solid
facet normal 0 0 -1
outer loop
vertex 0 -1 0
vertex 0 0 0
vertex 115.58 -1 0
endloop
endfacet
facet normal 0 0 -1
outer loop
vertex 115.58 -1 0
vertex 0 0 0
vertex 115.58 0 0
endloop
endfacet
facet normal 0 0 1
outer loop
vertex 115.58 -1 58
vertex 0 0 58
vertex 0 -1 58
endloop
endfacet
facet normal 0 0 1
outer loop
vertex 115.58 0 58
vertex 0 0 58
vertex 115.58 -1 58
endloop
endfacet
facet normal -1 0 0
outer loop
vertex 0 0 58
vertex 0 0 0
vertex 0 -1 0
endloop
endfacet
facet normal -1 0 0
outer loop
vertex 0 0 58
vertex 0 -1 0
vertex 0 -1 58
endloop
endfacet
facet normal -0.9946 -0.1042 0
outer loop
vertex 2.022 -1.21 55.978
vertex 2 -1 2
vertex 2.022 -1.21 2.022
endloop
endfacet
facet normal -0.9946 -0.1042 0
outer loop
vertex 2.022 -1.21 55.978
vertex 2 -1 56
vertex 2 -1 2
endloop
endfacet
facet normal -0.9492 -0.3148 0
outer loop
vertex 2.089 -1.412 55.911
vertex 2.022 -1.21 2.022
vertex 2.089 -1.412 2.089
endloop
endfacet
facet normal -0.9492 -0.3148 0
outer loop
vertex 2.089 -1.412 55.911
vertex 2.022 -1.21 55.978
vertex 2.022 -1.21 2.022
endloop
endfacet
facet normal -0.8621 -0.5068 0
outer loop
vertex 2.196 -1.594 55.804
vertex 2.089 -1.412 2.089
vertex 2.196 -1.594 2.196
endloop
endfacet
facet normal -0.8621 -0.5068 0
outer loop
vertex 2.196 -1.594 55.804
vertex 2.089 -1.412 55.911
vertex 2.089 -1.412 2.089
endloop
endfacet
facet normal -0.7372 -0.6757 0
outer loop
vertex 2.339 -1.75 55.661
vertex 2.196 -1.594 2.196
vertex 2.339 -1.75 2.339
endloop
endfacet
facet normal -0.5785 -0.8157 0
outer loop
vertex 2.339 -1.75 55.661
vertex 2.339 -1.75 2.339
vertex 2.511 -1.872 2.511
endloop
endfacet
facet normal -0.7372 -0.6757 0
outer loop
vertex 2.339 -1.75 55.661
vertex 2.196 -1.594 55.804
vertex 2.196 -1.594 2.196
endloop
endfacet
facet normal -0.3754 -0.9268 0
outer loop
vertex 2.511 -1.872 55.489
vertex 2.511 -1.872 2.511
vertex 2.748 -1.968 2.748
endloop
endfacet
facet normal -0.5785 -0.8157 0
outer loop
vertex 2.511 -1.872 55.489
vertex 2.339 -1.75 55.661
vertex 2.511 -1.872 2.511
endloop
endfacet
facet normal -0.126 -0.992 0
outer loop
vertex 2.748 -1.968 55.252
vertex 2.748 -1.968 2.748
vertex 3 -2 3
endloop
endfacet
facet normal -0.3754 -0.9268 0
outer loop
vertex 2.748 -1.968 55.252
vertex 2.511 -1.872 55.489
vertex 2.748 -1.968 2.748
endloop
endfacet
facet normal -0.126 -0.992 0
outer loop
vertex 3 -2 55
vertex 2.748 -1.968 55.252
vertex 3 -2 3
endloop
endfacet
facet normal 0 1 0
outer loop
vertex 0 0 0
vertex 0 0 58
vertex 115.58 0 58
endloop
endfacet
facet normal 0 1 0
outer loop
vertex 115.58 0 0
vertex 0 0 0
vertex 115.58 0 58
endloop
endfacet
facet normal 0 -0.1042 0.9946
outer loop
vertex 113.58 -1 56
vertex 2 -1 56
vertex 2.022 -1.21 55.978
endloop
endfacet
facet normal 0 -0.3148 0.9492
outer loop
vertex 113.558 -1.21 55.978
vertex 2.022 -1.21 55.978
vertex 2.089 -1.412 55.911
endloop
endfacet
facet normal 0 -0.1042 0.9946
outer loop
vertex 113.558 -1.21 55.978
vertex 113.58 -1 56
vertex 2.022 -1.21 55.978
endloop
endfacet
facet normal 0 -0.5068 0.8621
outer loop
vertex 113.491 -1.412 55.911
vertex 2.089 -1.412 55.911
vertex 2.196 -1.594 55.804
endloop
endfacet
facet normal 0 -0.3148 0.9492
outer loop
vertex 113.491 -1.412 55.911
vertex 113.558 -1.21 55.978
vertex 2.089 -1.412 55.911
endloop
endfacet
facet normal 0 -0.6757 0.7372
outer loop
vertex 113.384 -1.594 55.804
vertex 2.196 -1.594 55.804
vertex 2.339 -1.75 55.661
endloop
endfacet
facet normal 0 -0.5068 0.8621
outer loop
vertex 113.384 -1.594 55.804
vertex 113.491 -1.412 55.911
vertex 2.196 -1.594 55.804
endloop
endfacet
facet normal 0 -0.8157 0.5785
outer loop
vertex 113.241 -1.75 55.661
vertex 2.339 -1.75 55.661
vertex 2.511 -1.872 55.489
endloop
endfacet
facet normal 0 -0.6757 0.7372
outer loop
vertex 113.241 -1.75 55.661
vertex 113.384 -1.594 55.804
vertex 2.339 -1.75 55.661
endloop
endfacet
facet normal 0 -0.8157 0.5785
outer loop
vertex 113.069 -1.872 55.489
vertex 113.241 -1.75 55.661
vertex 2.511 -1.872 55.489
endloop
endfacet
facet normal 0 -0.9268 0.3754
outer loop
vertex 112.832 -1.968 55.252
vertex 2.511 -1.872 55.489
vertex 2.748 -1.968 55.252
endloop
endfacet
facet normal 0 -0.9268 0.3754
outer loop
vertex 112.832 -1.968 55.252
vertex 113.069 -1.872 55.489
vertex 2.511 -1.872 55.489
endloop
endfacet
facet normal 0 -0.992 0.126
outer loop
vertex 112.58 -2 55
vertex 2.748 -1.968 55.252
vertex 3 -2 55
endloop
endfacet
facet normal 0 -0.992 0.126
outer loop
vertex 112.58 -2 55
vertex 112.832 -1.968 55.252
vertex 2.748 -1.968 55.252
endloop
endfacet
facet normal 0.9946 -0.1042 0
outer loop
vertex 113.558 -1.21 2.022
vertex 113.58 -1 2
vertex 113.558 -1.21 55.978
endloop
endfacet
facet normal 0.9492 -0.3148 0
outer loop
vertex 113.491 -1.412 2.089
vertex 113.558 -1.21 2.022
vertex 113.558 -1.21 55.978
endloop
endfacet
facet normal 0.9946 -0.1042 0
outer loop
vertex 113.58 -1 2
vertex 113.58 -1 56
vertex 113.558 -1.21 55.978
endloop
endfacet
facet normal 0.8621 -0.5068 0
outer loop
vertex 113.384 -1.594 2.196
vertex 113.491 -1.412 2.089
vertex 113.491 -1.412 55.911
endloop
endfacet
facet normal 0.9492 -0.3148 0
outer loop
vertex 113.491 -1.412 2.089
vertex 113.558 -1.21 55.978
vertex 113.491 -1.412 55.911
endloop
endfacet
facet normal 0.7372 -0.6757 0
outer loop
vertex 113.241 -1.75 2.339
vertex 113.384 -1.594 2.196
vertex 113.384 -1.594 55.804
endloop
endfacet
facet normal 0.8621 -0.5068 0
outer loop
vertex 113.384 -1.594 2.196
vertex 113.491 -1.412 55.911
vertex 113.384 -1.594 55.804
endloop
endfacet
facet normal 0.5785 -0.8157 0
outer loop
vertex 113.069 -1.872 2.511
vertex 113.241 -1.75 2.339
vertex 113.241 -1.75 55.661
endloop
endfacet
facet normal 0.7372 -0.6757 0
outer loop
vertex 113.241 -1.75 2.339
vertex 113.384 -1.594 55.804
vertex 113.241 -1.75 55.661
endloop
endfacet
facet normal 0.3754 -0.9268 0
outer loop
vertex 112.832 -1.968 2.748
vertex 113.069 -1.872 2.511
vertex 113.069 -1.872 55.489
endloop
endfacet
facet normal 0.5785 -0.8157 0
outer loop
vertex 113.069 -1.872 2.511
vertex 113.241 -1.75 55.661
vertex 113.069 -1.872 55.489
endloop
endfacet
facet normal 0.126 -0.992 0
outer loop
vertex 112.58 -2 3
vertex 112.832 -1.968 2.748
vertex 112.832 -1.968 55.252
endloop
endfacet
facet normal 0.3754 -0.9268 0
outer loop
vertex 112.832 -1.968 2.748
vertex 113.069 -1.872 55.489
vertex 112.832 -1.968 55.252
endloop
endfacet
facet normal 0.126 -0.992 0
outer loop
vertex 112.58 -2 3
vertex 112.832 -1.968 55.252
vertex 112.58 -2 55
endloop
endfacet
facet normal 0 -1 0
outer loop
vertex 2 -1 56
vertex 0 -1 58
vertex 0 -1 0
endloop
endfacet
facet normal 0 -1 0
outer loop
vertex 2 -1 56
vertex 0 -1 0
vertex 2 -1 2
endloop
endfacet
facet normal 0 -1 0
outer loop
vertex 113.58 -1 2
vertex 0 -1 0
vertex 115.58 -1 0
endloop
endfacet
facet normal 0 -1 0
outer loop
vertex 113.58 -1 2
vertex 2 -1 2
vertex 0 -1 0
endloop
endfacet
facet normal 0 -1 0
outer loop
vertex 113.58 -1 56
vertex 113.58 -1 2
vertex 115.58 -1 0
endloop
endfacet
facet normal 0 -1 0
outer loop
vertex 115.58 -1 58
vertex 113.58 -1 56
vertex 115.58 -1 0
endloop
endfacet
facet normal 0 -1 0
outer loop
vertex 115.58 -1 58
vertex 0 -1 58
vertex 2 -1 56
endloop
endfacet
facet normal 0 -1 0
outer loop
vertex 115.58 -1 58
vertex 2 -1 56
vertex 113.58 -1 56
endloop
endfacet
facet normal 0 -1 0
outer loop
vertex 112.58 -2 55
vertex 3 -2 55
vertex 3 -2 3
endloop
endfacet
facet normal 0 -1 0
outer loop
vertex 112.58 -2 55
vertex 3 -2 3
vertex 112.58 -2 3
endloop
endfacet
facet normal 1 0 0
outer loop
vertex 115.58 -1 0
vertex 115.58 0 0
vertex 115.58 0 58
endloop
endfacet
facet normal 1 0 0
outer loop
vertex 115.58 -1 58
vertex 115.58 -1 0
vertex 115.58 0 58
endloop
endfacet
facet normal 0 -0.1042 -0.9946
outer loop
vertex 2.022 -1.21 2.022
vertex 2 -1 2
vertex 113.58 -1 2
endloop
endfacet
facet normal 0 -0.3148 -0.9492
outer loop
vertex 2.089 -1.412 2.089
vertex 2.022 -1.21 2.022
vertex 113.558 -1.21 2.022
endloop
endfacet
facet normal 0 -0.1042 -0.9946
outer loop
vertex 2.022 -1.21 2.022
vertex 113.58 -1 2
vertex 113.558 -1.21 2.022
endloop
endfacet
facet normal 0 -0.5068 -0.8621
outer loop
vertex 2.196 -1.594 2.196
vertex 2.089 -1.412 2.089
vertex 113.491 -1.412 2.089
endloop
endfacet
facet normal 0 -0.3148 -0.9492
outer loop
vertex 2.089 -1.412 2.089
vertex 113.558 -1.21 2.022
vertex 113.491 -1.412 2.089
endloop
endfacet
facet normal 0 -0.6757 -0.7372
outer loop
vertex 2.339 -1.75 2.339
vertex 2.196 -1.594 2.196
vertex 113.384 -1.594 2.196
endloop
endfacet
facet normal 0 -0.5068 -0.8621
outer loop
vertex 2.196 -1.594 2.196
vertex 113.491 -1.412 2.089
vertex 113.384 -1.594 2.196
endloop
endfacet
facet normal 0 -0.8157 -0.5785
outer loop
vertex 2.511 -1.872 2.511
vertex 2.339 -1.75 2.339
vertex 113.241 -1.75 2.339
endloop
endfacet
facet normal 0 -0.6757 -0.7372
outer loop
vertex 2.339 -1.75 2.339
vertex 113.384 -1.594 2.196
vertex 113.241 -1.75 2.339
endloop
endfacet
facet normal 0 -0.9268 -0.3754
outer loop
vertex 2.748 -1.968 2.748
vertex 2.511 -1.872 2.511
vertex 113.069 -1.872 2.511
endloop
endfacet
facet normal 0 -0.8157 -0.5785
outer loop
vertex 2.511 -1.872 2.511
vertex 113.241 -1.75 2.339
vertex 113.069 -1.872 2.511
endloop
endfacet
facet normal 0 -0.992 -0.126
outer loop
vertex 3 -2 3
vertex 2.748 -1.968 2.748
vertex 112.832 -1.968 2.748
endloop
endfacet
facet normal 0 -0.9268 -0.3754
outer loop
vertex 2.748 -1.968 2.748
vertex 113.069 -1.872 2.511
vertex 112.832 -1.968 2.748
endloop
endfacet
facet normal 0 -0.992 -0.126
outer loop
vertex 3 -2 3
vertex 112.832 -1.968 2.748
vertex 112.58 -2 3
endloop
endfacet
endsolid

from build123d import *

# Parameters (mm, degrees)
F0_W     = 115.58
F0_H     = 58
F1_DEPTH = 1
F2_W     = 111.58
F2_H     = 54
F3_DEPTH = 1
F4_R     = 0.99999


# Not quite as in the source:
# - a fillet or chamfer is up to 0.001 mm smaller than in the source, because OpenCascade refuses the exact size
# - a feature names something its author has since deleted; it is built from what else it names


with BuildPart() as f1:
    # F0 (on Front) → F1 (new body)
    with BuildSketch(Plane.XZ):
        with Locations((57.79, 29)):
            Rectangle(F0_W, F0_H)
    extrude(amount=F1_DEPTH)

    # F2 (on face) → F3 (join)
    with BuildSketch(Plane.XZ.offset(1)):
        with Locations((57.79, 29)):
            Rectangle(F2_W, F2_H)
    extrude(amount=F3_DEPTH)

    # F4 (radius 1 in the source; OpenCascade refuses exactly that, so slightly less here)
    f4_edges = [f1.edges().sort_by_distance(p)[0] for p in [
        (57.79, -2, 56),
        (2, -2, 29),
        (57.79, -2, 2),
        (113.58, -2, 29),
    ]]
    fillet(f4_edges, radius=F4_R)


solid = f1.part
